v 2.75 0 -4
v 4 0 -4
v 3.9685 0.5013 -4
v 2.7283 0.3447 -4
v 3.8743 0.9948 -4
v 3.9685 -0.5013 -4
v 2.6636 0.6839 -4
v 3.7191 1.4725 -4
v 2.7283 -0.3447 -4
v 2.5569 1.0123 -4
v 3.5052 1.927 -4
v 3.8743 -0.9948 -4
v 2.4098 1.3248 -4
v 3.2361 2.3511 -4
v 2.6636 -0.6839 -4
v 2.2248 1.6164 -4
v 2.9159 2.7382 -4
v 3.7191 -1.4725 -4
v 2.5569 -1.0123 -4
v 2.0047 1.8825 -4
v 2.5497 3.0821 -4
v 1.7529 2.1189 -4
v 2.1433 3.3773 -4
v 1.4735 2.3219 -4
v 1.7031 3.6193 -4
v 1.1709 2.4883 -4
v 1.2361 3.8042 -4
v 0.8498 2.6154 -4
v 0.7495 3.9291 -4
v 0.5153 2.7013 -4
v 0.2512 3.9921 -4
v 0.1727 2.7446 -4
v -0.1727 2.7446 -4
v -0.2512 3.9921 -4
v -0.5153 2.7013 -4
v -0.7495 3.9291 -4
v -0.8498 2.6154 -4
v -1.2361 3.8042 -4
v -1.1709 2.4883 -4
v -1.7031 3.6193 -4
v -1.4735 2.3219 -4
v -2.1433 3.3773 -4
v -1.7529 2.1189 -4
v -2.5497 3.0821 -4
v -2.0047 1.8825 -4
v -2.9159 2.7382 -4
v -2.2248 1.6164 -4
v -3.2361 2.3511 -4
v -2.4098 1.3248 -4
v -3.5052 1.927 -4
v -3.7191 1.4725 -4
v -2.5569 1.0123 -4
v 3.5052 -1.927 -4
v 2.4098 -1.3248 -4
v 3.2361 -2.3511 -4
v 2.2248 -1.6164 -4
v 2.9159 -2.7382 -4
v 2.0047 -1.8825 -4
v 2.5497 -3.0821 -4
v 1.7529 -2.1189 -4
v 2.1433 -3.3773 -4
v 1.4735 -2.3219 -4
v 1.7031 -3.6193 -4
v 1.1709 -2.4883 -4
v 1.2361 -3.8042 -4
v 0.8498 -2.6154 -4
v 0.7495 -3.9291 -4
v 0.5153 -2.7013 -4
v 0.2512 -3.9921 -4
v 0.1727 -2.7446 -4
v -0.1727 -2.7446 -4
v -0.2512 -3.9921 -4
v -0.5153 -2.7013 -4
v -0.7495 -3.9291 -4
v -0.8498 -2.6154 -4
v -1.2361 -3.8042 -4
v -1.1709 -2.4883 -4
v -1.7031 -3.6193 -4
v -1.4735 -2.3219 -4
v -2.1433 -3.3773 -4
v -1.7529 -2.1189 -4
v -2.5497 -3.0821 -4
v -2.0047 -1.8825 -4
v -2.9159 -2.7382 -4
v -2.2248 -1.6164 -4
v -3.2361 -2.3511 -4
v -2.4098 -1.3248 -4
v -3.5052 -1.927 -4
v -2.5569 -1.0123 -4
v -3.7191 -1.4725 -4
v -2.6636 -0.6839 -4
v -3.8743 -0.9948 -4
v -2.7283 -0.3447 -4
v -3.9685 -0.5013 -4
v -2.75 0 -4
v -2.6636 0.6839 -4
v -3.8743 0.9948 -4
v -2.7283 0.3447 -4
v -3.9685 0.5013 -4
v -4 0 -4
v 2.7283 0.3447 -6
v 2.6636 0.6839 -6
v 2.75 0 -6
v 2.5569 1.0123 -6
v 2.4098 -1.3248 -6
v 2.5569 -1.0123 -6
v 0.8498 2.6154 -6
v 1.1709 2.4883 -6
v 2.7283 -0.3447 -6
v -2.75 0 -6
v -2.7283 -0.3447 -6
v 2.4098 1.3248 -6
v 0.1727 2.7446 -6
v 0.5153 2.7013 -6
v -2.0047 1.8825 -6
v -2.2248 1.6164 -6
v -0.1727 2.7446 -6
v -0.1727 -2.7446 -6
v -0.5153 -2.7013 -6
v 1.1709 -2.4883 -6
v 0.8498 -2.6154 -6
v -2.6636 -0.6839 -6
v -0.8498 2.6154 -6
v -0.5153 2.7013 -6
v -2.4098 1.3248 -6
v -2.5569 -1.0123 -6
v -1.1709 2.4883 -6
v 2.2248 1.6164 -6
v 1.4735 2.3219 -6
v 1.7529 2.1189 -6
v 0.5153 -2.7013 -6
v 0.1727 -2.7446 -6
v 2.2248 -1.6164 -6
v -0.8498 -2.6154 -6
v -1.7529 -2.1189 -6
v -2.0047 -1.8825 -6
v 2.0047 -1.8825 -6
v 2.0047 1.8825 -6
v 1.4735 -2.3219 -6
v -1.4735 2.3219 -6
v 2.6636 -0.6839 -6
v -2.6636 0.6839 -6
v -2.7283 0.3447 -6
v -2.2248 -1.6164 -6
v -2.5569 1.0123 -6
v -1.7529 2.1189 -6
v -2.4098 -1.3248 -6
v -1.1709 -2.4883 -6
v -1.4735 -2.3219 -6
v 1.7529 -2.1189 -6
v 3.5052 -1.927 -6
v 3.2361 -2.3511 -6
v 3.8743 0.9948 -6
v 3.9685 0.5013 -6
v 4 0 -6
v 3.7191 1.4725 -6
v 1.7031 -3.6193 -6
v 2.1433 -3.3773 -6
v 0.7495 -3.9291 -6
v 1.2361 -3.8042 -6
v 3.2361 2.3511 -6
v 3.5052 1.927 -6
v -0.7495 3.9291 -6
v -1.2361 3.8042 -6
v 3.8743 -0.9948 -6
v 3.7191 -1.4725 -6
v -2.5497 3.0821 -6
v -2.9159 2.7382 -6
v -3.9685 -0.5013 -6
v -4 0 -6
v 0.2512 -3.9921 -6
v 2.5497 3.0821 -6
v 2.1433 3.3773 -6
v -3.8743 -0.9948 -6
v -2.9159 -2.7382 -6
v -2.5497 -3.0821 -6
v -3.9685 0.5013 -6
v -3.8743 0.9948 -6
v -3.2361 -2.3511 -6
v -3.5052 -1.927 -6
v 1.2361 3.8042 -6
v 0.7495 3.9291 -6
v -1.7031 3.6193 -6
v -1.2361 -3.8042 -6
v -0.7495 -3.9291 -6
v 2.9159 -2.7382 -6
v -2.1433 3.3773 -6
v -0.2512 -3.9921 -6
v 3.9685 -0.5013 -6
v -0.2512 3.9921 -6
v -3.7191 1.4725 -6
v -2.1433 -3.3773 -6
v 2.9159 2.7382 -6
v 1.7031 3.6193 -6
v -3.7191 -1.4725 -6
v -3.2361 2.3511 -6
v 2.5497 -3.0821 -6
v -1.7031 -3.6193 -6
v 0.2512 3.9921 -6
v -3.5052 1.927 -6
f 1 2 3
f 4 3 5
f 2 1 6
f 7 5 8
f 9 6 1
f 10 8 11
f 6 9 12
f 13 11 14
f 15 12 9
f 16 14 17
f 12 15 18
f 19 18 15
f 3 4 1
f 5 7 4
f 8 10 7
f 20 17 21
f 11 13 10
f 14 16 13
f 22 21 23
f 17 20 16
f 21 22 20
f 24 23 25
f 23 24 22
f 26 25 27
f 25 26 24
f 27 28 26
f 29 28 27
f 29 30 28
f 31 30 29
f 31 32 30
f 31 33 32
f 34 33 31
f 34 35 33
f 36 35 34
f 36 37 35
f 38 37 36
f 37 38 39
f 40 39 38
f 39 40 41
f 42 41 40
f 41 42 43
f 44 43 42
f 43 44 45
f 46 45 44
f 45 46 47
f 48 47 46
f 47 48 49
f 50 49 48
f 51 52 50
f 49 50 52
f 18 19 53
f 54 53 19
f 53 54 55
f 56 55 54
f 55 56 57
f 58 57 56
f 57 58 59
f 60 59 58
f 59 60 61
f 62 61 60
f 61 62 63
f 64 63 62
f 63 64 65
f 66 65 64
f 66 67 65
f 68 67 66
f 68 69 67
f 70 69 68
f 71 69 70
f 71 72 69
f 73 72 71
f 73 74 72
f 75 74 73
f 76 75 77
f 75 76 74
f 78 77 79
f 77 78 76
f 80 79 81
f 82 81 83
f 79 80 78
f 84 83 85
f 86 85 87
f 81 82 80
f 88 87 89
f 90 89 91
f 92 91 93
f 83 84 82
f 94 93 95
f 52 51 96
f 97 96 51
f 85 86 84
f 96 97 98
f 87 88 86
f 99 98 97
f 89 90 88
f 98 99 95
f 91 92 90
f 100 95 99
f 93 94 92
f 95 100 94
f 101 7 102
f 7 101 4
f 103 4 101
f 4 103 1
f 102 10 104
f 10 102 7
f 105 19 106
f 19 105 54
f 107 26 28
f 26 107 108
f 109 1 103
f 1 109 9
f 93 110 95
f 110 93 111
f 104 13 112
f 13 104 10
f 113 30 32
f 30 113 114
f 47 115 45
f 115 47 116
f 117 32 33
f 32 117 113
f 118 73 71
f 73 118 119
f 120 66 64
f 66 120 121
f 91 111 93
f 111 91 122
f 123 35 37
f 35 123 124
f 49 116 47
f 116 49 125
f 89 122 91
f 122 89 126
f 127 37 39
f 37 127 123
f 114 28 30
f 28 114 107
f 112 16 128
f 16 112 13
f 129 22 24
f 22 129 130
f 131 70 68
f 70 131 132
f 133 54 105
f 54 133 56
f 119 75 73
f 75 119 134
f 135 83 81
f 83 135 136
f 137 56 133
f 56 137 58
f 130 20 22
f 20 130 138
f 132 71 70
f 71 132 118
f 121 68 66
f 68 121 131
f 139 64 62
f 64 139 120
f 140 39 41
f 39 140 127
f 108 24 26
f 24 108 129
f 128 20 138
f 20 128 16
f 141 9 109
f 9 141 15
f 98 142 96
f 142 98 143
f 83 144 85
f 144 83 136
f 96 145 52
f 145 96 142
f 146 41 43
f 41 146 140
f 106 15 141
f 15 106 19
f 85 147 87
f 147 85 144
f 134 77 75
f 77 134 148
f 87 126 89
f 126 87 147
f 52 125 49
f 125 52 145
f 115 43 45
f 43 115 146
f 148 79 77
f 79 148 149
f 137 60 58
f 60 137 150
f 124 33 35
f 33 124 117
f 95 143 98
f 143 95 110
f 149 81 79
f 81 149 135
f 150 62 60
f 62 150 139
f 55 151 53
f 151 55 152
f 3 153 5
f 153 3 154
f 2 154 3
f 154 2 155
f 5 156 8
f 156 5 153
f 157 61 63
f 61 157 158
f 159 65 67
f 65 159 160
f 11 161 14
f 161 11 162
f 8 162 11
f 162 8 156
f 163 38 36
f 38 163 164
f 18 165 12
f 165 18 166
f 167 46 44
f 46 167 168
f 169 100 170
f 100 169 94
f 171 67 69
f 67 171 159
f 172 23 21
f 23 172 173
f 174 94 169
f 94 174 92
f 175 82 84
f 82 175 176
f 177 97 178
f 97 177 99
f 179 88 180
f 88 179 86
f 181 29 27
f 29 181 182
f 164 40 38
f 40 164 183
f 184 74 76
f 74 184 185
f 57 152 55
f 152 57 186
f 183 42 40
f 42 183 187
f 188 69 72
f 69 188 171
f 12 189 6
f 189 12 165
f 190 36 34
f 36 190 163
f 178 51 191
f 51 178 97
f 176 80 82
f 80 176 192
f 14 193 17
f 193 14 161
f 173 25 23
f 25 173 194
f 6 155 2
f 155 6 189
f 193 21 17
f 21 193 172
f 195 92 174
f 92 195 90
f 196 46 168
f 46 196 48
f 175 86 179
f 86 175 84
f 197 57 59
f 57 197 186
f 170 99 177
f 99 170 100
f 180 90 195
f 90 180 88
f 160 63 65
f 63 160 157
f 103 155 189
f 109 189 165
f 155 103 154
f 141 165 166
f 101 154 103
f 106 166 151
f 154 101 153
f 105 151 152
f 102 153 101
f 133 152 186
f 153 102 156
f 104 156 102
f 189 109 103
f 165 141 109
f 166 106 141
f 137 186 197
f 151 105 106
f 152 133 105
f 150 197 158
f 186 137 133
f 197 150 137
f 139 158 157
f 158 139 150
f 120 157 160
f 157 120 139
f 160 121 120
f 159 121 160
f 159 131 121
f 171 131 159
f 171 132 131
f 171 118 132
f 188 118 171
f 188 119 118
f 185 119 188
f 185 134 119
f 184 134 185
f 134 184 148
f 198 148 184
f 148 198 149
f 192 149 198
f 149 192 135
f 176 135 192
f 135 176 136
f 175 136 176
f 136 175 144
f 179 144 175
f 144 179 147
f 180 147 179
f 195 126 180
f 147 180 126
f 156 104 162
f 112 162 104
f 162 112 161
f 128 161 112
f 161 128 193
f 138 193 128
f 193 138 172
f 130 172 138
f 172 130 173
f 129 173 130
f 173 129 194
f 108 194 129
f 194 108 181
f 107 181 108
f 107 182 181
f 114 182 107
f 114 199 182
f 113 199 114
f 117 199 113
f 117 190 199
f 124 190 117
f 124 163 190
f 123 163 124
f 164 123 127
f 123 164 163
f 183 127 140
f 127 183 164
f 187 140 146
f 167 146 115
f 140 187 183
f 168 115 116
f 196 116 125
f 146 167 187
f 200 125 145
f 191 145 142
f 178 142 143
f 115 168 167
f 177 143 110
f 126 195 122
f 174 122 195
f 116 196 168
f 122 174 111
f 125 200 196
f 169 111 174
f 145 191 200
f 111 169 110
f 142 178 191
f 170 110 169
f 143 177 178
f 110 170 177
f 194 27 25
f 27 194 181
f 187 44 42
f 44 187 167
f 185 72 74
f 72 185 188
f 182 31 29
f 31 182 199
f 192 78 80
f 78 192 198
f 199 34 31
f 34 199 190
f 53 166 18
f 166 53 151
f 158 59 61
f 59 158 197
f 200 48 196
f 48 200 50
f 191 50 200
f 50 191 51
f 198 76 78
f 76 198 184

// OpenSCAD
$fn = 50;

difference() {
	union() {
		translate(v = [0, 0, -6.0]) {
			cylinder(h = 6.0, r = 4.0);
		}
	}
	union() {
		translate(v = [0, 0, 0]) {
			rotate(a = [0, 0, 0]) {
				difference() {
					union() {
						translate(v = [0, 0, -4]) {
							linear_extrude(height = 4) {
								polygon(points = [[4.8468, 0.0], [2.4234000000000004, 4.197451927062417], [-2.423399999999999, 4.197451927062417], [-4.8468, 5.935618106107392e-16], [-2.423400000000002, -4.197451927062416], [2.423399999999997, -4.197451927062419]]);
							}
						}
					}
					union();
				}
			}
		}
		#translate(v = [0, 0, -100.0]) {
			cylinder(h = 200, r = 2.75);
		}
	}
}
